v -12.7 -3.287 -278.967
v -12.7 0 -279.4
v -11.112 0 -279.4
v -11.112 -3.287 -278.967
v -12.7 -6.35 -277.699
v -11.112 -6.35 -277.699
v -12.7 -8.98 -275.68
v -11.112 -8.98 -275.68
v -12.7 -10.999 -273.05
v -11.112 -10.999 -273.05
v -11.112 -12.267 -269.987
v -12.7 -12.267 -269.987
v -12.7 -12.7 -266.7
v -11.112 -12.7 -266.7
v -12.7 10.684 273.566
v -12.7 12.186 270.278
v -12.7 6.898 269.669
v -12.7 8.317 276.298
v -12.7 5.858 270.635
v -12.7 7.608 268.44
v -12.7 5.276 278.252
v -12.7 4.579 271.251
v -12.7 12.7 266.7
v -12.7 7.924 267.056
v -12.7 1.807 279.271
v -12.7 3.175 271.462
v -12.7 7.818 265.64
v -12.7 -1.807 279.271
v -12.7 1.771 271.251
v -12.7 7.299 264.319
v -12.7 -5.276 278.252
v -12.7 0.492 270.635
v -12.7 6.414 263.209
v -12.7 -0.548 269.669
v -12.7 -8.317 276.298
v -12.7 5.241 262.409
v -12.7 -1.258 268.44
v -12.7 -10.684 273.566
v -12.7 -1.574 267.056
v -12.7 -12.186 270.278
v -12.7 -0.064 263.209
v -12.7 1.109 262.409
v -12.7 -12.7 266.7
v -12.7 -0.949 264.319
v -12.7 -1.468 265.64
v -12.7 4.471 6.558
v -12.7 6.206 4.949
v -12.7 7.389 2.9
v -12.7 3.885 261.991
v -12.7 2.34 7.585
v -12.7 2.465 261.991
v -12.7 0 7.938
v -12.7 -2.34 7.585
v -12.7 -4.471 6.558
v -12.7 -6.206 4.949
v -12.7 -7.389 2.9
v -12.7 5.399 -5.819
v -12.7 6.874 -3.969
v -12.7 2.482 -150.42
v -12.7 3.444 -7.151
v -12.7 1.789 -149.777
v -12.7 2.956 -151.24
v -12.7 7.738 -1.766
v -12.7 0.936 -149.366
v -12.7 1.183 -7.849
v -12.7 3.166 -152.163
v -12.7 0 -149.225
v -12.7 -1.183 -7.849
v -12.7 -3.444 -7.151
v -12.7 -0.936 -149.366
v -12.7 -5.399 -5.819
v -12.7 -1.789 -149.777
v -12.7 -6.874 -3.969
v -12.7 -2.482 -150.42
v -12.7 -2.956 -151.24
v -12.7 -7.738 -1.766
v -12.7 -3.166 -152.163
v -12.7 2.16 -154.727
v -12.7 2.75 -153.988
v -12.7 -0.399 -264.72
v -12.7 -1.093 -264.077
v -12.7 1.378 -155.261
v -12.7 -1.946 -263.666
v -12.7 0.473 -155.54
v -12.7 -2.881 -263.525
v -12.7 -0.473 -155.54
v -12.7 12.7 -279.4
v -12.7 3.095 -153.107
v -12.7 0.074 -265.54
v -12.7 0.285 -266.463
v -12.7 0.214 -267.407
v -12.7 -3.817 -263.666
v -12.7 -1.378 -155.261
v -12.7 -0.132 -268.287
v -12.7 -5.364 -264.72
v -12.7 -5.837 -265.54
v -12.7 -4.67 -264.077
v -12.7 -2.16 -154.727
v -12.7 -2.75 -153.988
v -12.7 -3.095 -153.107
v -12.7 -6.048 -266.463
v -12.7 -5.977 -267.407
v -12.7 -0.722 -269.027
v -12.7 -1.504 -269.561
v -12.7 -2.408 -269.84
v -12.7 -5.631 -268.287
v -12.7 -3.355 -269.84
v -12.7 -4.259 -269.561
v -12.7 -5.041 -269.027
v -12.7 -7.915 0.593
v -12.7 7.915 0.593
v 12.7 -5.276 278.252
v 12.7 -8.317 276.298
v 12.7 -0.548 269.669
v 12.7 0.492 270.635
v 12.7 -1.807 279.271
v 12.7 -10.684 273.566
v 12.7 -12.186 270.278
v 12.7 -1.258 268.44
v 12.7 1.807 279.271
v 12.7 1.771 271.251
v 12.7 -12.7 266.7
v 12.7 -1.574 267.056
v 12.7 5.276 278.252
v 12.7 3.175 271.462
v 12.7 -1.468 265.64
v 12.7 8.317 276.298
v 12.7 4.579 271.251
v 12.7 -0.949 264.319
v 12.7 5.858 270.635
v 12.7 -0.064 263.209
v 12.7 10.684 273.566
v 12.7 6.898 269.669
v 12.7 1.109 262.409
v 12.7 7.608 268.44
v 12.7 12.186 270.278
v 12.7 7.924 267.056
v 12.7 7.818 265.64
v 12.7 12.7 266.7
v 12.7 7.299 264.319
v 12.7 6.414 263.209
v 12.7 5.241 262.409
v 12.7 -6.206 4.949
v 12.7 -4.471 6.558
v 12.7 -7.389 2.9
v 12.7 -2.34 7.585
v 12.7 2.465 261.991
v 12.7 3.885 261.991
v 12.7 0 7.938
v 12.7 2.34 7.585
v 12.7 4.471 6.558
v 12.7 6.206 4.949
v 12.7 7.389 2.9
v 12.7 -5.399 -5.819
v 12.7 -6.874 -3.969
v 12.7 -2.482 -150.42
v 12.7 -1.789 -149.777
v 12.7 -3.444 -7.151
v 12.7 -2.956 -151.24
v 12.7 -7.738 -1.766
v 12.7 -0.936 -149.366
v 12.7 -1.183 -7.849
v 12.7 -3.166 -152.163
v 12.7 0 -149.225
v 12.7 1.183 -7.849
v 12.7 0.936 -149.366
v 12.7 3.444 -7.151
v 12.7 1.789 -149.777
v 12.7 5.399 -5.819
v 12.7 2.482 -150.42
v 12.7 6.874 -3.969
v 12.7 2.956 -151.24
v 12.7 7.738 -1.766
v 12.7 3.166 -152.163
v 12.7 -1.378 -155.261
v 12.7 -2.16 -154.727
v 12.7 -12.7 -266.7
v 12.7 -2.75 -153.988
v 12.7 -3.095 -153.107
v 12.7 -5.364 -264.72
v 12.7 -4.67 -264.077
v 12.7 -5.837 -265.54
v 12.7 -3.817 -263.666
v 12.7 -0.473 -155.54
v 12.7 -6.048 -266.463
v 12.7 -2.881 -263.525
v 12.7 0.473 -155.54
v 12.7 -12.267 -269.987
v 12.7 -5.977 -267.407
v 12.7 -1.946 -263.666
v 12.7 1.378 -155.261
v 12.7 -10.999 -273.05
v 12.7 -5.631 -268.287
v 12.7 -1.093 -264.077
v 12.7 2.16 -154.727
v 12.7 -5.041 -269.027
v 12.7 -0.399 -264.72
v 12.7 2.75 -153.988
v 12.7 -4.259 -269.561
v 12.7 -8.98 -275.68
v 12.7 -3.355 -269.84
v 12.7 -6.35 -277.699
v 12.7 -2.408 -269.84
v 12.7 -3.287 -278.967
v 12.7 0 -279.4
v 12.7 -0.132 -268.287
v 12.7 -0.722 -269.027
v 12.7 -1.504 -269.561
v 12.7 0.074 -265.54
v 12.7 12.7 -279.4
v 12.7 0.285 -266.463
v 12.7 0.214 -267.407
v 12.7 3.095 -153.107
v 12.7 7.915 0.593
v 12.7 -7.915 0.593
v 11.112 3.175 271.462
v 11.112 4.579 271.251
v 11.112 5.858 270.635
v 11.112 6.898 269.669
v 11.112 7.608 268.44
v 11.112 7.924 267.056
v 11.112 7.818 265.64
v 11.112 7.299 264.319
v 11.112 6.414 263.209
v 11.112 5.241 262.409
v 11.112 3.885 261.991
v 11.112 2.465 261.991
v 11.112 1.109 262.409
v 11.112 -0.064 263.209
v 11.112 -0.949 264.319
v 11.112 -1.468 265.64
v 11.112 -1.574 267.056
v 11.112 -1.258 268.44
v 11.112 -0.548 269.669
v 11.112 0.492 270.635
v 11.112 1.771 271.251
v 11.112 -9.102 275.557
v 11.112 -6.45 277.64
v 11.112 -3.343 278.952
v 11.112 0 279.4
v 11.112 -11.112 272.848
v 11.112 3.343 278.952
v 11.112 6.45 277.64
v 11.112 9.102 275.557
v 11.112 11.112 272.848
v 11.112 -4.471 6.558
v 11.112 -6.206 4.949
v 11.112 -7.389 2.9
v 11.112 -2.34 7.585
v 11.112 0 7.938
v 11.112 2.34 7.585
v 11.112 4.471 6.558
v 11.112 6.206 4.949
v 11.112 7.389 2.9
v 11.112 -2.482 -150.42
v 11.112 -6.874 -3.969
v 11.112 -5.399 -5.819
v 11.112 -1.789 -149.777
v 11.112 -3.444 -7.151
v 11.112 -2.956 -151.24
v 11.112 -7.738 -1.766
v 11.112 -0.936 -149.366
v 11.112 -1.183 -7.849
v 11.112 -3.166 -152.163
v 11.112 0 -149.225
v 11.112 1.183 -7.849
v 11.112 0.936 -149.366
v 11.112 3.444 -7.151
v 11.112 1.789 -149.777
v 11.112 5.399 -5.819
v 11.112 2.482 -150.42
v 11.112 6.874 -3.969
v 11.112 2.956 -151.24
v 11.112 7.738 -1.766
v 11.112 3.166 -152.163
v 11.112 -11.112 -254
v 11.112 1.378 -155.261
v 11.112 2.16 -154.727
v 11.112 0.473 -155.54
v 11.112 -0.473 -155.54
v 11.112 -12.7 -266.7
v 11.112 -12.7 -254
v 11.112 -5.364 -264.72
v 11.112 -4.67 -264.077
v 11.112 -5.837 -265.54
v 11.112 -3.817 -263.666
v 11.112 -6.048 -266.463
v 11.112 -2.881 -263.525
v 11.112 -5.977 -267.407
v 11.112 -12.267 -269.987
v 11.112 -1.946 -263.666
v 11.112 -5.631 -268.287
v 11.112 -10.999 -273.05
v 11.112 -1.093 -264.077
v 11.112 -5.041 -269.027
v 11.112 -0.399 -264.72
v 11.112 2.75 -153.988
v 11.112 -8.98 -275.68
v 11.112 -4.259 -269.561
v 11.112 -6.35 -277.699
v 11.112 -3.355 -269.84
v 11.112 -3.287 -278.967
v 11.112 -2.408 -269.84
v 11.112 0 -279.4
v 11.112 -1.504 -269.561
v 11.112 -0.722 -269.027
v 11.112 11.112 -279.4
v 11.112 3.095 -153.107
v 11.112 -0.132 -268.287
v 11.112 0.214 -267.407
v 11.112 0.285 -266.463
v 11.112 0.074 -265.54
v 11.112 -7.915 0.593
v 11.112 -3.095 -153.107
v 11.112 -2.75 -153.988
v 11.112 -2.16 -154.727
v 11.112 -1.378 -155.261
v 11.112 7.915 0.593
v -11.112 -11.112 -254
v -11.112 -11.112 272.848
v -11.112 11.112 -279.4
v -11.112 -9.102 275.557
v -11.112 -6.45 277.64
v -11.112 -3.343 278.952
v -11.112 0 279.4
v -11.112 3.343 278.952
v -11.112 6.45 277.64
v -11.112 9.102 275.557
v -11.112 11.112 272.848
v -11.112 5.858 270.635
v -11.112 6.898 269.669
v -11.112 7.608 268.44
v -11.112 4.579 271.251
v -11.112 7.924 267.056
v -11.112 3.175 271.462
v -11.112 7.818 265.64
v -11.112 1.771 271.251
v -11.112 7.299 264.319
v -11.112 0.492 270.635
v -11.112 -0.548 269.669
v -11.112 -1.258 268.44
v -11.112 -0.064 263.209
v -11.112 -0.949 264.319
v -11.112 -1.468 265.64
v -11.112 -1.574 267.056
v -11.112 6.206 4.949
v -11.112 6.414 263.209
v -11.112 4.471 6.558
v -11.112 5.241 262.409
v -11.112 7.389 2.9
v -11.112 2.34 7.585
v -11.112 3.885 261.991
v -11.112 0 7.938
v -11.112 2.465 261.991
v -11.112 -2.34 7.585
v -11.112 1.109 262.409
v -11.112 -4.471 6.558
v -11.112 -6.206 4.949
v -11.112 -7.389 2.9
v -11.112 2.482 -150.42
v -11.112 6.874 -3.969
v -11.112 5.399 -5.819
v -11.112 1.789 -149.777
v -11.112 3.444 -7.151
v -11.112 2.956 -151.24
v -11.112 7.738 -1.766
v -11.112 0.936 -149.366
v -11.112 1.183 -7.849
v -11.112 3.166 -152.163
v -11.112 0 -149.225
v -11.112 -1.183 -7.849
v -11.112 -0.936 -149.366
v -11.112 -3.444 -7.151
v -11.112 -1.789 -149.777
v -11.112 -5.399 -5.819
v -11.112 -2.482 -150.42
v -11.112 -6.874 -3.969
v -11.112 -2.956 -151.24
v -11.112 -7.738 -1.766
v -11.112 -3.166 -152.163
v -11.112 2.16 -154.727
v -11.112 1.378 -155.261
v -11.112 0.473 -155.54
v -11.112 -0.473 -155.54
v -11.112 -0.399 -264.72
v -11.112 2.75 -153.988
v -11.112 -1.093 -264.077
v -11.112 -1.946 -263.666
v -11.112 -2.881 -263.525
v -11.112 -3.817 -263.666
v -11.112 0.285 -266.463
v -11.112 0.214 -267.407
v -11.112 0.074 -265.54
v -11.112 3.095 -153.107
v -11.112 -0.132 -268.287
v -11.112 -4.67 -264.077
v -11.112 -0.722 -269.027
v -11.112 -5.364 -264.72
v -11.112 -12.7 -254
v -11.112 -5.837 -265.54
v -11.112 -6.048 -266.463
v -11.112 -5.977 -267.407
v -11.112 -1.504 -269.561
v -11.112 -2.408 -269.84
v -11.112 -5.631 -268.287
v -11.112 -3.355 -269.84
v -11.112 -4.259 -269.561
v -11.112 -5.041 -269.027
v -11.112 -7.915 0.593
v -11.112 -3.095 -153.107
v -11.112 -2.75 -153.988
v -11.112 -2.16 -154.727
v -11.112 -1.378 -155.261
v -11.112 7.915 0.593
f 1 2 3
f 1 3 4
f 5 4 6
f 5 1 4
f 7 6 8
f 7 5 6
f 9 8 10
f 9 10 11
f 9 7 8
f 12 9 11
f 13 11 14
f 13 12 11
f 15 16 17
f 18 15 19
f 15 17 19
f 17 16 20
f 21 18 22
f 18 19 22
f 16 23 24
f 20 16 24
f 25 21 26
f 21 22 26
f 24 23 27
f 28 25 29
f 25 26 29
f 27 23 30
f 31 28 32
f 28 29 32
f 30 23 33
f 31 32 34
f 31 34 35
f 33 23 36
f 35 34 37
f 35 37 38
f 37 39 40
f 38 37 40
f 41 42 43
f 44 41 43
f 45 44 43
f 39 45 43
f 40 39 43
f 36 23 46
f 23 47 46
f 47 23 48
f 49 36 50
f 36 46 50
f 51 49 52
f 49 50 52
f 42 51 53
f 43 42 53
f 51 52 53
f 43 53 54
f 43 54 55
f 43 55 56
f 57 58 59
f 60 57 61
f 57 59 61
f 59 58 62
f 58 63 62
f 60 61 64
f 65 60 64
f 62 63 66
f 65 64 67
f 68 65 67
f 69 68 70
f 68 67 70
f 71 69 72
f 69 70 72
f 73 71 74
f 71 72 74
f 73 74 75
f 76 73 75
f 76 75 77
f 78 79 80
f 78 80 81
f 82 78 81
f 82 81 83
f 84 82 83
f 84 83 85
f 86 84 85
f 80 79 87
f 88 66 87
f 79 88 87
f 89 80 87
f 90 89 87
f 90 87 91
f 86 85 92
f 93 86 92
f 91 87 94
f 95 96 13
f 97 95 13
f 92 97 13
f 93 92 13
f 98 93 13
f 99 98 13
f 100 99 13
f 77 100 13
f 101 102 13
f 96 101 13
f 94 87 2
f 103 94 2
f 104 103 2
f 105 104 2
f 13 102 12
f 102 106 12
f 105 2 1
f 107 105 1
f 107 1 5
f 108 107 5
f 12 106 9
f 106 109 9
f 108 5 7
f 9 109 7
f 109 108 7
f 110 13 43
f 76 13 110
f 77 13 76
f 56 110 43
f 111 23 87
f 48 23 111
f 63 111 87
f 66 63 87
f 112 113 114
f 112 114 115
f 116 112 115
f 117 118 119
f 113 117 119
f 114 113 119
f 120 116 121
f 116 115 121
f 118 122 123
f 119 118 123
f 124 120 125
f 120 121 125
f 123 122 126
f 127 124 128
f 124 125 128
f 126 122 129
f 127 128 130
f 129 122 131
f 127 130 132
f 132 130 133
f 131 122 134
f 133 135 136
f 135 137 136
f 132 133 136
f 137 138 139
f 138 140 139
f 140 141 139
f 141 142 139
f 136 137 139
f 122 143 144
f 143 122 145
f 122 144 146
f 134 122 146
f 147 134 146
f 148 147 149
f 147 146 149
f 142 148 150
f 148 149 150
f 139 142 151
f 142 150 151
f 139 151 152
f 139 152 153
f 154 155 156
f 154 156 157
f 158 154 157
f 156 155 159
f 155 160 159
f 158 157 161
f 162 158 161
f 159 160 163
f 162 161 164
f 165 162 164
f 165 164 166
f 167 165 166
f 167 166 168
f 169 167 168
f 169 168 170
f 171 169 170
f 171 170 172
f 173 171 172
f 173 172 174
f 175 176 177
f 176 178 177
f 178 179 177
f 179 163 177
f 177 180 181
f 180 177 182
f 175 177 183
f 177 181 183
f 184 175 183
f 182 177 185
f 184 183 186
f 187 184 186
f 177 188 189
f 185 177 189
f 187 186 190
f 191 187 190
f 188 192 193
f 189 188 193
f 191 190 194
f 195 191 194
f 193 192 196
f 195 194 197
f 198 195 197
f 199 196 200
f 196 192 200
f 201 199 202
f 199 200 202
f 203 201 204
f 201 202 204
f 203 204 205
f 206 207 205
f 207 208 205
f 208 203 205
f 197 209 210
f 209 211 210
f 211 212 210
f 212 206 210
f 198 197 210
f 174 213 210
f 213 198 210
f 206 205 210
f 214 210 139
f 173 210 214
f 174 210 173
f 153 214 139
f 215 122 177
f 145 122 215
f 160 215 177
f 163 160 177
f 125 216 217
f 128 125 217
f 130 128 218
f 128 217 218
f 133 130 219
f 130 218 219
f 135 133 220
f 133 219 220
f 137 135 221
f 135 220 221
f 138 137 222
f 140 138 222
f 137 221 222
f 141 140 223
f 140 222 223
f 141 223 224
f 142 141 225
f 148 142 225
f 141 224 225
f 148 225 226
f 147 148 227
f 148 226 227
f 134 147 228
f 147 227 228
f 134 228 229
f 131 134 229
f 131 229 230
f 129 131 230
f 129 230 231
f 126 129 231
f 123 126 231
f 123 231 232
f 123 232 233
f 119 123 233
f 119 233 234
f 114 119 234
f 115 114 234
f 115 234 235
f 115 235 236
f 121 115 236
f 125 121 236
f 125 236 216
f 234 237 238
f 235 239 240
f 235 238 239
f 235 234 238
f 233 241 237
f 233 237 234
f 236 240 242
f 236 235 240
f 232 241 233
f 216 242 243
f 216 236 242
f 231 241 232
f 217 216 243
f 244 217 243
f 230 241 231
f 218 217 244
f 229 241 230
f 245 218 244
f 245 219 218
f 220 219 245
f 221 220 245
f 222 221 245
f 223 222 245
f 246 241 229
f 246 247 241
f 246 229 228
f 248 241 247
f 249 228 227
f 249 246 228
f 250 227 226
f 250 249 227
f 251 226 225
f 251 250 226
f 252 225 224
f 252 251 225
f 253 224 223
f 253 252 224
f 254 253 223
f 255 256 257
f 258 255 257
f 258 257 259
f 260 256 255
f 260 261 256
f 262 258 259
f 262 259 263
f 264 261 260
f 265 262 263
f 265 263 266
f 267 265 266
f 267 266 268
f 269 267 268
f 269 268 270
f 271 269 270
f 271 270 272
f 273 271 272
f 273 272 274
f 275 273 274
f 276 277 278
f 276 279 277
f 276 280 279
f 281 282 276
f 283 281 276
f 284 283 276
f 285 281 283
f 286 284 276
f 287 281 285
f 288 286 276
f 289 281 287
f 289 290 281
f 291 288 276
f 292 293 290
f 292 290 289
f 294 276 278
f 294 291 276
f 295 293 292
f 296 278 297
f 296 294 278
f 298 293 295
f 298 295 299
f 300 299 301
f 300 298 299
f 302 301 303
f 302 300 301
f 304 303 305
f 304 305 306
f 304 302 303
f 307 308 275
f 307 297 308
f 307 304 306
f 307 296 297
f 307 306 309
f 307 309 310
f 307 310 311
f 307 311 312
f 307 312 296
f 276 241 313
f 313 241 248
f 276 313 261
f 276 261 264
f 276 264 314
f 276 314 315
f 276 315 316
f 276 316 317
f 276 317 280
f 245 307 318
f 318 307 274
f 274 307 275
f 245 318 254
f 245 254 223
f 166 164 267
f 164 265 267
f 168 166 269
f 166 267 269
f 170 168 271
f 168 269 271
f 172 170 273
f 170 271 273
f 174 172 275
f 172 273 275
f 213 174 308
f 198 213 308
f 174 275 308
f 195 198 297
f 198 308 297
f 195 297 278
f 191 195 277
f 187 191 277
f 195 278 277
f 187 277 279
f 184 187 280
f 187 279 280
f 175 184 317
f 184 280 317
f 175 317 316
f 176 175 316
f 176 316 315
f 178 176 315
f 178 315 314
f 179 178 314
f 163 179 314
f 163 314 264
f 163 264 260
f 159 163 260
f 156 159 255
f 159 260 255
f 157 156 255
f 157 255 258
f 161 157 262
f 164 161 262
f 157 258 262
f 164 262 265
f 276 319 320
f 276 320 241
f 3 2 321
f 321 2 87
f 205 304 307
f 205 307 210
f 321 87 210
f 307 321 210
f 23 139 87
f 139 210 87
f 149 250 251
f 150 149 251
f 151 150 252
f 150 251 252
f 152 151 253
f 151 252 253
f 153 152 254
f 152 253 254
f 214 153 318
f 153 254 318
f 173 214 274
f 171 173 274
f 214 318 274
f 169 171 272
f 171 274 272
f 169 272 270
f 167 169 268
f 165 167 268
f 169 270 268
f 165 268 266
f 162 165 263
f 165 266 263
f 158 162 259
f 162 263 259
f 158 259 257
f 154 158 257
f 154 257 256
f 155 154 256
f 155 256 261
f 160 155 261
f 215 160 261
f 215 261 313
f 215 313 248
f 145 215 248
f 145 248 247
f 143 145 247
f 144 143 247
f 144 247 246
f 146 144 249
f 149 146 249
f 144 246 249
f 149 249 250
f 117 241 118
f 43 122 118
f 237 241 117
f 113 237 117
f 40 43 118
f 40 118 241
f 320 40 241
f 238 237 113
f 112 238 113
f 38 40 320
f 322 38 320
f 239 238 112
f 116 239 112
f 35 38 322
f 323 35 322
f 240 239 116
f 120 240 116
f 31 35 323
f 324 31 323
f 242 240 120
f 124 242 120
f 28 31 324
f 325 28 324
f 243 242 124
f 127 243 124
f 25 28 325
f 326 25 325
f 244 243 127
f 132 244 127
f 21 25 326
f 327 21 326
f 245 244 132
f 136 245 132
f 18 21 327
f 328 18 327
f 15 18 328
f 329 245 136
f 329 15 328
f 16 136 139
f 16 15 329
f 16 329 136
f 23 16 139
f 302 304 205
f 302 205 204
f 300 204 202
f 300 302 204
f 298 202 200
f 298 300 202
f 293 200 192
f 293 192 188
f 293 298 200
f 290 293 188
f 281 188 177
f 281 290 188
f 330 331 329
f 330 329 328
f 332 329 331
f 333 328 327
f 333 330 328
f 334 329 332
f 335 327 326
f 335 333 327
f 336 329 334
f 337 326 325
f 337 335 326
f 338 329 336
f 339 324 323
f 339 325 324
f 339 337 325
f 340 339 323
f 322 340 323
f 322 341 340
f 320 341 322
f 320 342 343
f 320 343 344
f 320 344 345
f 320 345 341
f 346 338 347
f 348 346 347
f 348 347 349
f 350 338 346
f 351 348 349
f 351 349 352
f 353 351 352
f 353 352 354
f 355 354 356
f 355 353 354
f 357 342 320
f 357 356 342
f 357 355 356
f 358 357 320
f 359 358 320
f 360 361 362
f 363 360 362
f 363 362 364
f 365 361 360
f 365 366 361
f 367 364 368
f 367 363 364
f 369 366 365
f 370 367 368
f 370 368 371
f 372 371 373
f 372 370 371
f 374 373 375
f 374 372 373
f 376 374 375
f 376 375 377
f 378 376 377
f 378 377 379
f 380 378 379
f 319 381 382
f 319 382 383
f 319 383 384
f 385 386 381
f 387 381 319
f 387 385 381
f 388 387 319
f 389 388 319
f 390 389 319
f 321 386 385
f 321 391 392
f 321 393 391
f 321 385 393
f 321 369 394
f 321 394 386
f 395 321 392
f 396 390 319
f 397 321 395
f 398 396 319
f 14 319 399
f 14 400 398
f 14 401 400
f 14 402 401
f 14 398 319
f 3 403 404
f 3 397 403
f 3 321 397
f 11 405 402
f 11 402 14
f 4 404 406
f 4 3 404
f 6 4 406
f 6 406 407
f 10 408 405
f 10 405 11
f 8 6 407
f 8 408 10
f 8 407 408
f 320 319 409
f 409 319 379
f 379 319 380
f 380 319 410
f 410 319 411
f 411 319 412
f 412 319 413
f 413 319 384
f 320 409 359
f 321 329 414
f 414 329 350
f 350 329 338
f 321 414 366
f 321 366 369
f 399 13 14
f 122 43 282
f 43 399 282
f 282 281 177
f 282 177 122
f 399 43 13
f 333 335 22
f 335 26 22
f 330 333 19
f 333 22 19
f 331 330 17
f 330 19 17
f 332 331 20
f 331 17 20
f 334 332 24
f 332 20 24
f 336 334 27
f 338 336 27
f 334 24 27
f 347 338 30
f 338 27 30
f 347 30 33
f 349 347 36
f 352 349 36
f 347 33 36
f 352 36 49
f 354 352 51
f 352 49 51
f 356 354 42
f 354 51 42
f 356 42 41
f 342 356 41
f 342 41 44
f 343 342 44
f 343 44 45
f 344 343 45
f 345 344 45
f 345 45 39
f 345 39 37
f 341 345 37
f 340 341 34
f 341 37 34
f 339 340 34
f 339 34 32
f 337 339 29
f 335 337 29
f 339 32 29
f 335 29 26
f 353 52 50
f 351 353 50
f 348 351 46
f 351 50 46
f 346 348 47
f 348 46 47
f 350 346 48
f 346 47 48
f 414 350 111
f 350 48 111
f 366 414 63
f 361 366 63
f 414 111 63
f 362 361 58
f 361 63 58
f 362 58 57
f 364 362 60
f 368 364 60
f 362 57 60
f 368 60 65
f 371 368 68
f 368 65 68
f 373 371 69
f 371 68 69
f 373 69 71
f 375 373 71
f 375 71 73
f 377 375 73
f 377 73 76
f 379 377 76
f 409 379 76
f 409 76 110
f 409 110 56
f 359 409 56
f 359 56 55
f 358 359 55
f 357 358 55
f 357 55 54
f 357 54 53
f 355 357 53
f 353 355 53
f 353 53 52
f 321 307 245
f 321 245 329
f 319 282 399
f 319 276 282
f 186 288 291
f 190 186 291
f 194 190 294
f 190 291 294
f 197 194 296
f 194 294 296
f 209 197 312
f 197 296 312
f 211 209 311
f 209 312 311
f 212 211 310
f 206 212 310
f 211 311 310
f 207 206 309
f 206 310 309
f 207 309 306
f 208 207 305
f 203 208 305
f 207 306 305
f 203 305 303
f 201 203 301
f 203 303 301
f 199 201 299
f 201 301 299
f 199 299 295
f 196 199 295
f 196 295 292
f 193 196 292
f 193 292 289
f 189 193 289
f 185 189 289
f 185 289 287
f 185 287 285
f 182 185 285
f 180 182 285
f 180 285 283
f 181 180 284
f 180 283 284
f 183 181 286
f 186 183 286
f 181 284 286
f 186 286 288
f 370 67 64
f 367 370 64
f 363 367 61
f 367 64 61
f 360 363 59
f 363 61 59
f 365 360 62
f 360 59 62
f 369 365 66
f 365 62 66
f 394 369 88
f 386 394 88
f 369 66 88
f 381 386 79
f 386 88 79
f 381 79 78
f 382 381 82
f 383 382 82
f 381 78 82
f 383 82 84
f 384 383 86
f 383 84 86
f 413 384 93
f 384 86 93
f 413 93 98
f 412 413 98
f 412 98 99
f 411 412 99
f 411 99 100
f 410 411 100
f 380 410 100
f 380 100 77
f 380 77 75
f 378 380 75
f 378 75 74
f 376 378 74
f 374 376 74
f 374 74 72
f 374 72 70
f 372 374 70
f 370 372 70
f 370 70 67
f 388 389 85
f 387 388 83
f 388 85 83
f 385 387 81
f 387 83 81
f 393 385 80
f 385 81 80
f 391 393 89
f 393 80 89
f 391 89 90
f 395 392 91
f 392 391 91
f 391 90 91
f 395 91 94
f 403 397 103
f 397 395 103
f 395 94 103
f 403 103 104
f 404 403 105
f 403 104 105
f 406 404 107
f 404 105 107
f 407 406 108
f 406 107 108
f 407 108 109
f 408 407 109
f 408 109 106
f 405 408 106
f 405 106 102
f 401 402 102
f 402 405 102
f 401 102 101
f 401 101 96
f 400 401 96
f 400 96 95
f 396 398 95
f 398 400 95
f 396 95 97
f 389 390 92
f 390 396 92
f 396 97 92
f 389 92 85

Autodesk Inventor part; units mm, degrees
ref_plane "YZ Plane" through (0, 0, 0) normal (1, 0, 0) x (0, 1, 0)
ref_plane "XZ Plane" through (0, 0, 0) normal (0, 1, 0) x (-1, 0, 0)
ref_plane "XY Plane" through (0, 0, 0) normal (0, 0, 1) x (1, 0, 0)
sketch "Sketch1" plane through (0, 0, 0) normal (0, 0, 1) x (1, 0, 0)
  line L0 (-12.7, -12.7) -> (12.7, -12.7)
  line L1 (12.7, -12.7) -> (12.7, 12.7)
  line L2 (12.7, 12.7) -> (-12.7, 12.7)
  line L3 (-12.7, 12.7) -> (-12.7, -12.7)
  line L4 (-12.7, -12.7) -> (12.7, 12.7) construction
  line L5 (12.7, -12.7) -> (-12.7, 12.7) construction
  line L6 (-11.1125, -11.1125) -> (11.1125, -11.1125)
  line L7 (11.1125, -11.1125) -> (11.1125, 11.1125)
  line L8 (11.1125, 11.1125) -> (-11.1125, 11.1125)
  line L9 (-11.1125, 11.1125) -> (-11.1125, -11.1125)
  line L10 (-11.1125, -11.1125) -> (11.1125, 11.1125) construction
  line L11 (11.1125, -11.1125) -> (-11.1125, 11.1125) construction
  point P0 (0, 0)
  dimension "d0" = 25.4
  dimension "d1" = 25.4
  dimension "d2" = 1.5875
extrude "Extrusion1" add sketch "Sketch1" along normal mid plane 558.8
sketch "Sketch2" plane through (-12.7, -12.7, 279.4) normal (-1, 0, 0) x (0, 0, 1)
  circle A0 centre (-279.4, 12.7) radius 7.9375
  line L0 (-558.8, 12.7) -> (0, 12.7) construction
  line L1 (0, 1.5875) -> (0, 23.8125) construction
  circle A1 centre (-546.1, 9.8186) radius 3.175
  line L2 (-546.1, 0) -> (-558.8, 0)
  arc A2 (-558.8, 12.7) -> (-546.1, 0) centre (-546.1, 12.7) ccw
  line L3 (-558.8, 12.7) -> (-558.8, 0)
  line L4 (-558.8, 25.4) -> (0, 25.4) construction
  line L5 (-279.4, 25.4) -> (-279.4, 0) construction
  arc A3 (-12.7, 0) -> (0, 12.7) centre (-12.7, 12.7) ccw
  arc A4 (0, 12.7) -> (-12.7, 25.4) centre (-12.7, 12.7) ccw
  line L6 (-12.7, 25.4) -> (0, 25.4)
  line L7 (0, 25.4) -> (0, 12.7)
  line L8 (0, 12.7) -> (0, 0)
  line L9 (0, 0) -> (-12.7, 0)
  line L10 (-558.8, 0) -> (-558.8, 25.4) construction
  line L11 (0, 0) -> (-558.8, 0) construction
  circle A5 centre (-546.1, 9.8186) radius 12.7 construction
  circle A6 centre (-12.7, 15.875) radius 4.7625
  circle A7 centre (-431.8, 12.7) radius 3.175
  dimension "d5" = 15.875
  dimension "d6" = 6.35
  dimension "d13" = 12.7
  dimension "d14" = 9.8186
  dimension "d15" = 25.4
  dimension "d19" = 9.525
  dimension "d20" = 12.7
  dimension "d21" = 9.525
  dimension "d22" = 6.35
  dimension "d23" = 127
extrude "Extrusion2" cut sketch "Sketch2" against normal through all
sketch "Sketch4" plane through (0, 0, 0) normal (0, 1, 0) x (-1, 0, 0)
  line L0 (-12.7, -266.7) -> (12.7, -266.7) construction
  line L1 (11.1125, -290.9216) -> (-11.1125, -290.9216)
  line L2 (-11.1125, -290.9216) -> (-11.1125, -254)
  line L3 (-11.1125, -254) -> (11.1125, -254)
  line L4 (11.1125, -254) -> (11.1125, -290.9216)
  line L5 (-11.1125, 272.8484) -> (11.1125, 272.8484) construction
  line L6 (11.1125, -279.4) -> (11.1125, 272.8484) construction
  line L7 (-11.1125, -279.4) -> (11.1125, -279.4) construction
  line L8 (-11.1125, -279.4) -> (-11.1125, 272.8484) construction
  point P0 (0, 0)
  dimension "d16" = 12.7
extrude "Extrusion4" cut sketch "Sketch4" against normal through all
properties part number "Front lift arm" material "Aluminum 6061"
